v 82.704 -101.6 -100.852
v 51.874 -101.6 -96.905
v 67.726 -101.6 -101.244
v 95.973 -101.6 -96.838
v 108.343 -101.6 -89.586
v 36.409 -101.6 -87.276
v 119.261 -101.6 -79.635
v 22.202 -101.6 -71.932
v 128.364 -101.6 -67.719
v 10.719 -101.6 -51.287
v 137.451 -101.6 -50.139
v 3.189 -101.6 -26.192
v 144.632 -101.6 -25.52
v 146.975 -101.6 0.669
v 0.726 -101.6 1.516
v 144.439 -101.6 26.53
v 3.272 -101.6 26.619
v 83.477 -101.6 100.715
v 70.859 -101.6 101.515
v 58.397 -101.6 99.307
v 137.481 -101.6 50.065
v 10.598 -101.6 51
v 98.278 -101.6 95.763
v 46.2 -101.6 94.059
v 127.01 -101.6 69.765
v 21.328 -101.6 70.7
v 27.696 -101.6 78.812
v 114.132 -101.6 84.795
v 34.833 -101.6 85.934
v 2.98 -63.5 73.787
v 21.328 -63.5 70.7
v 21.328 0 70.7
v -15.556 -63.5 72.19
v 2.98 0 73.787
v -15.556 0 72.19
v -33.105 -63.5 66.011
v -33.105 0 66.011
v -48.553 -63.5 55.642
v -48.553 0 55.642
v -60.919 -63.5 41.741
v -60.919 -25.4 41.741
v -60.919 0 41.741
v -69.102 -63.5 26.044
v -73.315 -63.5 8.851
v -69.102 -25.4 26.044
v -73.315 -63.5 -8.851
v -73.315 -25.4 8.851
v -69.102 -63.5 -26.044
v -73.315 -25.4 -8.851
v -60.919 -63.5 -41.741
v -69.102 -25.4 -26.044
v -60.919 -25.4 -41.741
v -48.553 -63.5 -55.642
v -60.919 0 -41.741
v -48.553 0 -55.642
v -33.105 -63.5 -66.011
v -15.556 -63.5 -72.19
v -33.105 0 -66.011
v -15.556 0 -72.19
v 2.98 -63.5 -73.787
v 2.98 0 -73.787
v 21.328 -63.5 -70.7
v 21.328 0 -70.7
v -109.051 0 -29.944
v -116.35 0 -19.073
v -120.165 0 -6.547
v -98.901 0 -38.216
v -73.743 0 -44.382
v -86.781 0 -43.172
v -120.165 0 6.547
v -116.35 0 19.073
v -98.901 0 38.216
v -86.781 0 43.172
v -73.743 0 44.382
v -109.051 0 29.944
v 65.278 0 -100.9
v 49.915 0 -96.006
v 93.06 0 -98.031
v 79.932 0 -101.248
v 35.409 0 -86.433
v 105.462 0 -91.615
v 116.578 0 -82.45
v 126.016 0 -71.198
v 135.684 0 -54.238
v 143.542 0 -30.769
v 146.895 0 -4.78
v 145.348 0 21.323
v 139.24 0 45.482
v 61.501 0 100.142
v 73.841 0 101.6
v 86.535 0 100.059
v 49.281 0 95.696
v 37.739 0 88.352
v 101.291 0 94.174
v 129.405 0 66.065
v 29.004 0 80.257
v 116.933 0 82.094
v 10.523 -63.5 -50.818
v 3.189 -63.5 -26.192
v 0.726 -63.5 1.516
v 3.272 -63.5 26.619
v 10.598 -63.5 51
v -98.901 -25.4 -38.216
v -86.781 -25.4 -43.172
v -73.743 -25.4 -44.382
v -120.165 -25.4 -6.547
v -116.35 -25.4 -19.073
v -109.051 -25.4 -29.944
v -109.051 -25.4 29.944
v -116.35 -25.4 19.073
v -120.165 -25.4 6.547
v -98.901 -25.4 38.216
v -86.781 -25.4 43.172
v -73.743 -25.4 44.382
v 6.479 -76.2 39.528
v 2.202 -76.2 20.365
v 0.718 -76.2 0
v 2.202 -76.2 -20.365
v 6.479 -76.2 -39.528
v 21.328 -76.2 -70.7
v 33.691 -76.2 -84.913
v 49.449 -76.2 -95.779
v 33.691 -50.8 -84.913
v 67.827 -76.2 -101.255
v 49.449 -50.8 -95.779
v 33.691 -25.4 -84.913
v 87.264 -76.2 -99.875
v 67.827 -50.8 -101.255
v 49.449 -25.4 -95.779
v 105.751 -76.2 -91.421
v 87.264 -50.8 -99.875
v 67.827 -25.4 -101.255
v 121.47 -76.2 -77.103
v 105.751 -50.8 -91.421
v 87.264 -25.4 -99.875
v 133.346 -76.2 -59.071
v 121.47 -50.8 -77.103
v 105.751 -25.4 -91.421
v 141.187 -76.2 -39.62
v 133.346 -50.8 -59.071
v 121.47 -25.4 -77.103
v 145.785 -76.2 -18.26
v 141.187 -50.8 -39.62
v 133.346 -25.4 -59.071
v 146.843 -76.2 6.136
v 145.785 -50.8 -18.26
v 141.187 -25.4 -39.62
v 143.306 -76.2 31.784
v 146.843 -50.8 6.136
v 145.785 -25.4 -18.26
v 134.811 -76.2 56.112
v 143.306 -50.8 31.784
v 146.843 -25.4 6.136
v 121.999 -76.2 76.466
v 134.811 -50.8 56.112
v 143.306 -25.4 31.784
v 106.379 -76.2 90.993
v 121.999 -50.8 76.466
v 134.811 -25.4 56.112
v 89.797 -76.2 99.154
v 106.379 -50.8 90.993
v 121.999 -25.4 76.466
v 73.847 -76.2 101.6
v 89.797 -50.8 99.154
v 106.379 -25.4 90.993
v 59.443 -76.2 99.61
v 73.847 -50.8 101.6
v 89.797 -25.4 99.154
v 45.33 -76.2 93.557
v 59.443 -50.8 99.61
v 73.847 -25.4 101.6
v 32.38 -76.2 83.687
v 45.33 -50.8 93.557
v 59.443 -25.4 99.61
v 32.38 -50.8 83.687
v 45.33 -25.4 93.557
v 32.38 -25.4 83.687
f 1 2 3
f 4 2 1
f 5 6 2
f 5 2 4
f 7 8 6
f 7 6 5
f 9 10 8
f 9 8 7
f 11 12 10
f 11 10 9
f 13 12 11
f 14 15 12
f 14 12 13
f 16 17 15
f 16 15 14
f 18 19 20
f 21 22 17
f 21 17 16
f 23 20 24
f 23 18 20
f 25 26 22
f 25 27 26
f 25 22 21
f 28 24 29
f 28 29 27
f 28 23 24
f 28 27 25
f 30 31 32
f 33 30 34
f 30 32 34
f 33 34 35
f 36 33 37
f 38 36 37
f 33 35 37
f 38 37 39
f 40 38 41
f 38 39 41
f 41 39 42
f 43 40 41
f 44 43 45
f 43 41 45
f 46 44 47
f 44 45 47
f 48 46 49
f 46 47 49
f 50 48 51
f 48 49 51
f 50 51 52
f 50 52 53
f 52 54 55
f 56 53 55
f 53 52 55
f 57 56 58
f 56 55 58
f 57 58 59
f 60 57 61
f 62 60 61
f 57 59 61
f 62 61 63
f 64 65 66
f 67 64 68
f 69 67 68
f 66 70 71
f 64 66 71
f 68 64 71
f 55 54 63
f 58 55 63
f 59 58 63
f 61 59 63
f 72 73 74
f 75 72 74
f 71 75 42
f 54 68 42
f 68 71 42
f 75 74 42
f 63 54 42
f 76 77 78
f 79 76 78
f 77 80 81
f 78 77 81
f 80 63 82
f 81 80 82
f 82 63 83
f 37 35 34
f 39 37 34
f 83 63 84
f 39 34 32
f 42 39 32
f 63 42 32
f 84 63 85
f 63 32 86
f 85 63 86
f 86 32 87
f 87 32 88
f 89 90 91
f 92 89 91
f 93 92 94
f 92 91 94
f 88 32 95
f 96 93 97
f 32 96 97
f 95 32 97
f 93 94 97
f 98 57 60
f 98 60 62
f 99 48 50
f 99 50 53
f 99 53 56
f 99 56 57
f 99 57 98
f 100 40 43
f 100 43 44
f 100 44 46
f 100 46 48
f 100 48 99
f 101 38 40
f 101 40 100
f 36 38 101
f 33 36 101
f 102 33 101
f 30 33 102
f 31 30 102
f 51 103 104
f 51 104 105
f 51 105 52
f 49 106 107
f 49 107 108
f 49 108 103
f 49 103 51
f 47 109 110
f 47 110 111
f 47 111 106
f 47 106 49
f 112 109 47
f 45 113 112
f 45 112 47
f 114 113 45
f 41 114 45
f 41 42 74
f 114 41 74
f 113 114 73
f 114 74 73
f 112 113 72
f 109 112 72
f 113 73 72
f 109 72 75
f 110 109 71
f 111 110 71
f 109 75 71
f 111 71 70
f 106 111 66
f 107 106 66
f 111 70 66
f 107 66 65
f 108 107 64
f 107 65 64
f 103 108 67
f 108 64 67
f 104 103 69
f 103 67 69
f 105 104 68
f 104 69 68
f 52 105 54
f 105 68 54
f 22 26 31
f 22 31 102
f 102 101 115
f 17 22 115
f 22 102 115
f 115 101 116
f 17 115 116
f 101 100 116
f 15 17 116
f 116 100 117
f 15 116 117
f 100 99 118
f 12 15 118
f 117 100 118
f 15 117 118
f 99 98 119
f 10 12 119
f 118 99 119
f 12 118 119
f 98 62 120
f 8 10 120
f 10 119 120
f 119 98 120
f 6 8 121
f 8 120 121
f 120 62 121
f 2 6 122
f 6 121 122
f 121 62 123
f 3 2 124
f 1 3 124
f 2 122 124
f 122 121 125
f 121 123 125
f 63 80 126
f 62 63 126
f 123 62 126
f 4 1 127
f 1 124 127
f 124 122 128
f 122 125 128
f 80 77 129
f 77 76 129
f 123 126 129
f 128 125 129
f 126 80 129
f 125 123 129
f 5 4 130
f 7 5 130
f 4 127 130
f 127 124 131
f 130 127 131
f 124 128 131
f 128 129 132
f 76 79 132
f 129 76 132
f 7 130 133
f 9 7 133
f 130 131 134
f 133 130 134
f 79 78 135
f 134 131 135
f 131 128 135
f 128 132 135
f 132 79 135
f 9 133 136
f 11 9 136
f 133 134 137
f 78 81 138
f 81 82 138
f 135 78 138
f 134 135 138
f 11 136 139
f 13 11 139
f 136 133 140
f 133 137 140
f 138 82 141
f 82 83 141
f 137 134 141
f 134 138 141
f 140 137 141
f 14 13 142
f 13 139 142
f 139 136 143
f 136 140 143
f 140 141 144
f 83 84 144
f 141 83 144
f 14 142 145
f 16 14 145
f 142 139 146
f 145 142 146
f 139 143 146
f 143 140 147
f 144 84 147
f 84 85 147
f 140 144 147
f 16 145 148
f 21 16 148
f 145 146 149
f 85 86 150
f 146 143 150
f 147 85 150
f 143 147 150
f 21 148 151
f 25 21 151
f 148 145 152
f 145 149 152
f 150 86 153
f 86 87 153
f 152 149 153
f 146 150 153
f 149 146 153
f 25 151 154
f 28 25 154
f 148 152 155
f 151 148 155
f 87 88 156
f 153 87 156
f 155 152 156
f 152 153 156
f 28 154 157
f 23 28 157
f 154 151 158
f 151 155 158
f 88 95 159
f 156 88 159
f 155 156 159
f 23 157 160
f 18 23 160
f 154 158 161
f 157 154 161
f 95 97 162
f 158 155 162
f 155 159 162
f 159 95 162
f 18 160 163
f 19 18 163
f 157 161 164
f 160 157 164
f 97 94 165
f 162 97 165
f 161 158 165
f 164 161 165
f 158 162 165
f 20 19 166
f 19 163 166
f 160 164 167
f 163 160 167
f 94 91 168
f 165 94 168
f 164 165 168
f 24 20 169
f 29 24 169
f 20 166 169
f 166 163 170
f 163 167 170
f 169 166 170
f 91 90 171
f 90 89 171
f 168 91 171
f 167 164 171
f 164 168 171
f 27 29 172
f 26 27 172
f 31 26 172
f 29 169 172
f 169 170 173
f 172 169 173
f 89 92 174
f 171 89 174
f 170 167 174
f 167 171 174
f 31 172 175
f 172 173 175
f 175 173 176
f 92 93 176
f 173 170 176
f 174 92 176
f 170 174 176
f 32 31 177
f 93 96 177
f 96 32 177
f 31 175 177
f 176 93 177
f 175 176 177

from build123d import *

# Parameters (mm, degrees)
F1_DEPTH = 25.4
F2_DEPTH = 63.5
F3_DEPTH = 101.6


with BuildPart() as f1:
    # F0 (on Front) → F1 (new body)
    with BuildSketch(Plane.XZ):
        with BuildLine():
            ThreePointArc((-60.9186488081, -41.7406612999), (-70.5408318627, -21.8484694768), (-73.8468995853, 0))
            ThreePointArc((-73.8468995853, 0), (-70.5408318627, 21.8484694768), (-60.9186488081, 41.7406612999))
            ThreePointArc((-60.9186488081, 41.7406612999), (-120.65, 0), (-60.9186488081, -41.7406612999))
        make_face()
    extrude(amount=F1_DEPTH)

    # F0 (on Front) → F2 (join)
    with BuildSketch(Plane.XZ):
        with BuildLine():
            Line((-73.8468995853, 0), (-31.75, 0))
            ThreePointArc((-31.75, 0), (-39.7647247816, 25.4612101001), (-60.9186488081, 41.7406612999))
            ThreePointArc((-60.9186488081, 41.7406612999), (-70.5408318627, 21.8484694768), (-73.8468995853, 0))
        make_face()
        with BuildLine():
            ThreePointArc((-60.9186488081, -41.7406612999), (-39.7647247816, -25.4612101001), (-31.75, 0))
            Line((-31.75, 0), (-73.8468995853, 0))
            ThreePointArc((-73.8468995853, 0), (-70.5408318627, -21.8484694768), (-60.9186488081, -41.7406612999))
        make_face()
        with BuildLine():
            ThreePointArc((-60.9186488081, 41.7406612999), (-39.7647247816, 25.4612101001), (-31.75, 0))
            ThreePointArc((-31.75, 0), (-39.7647247816, -25.4612101001), (-60.9186488081, -41.7406612999))
            ThreePointArc((-60.9186488081, -41.7406612999), (-24.5260284139, -69.6551398577), (21.3275323846, -70.7000773743))
            add(Edge.make_bspline(
                [(21.3275323846, 70.7000773743), (-27.9803553448, 0), (21.3275323846, -70.7000773743)],
                knots=[0.8011700317, 0.8011700317, 0.8011700317, 2.3404226219, 2.3404226219, 2.3404226219], degree=2, weights=[1, 0.7181707686, 1]))
            ThreePointArc((21.3275323846, 70.7000773743), (-24.5260284139, 69.6551398577), (-60.9186488081, 41.7406612999))
        make_face()
    extrude(amount=F2_DEPTH)

    # F0 (on Front) → F3 (join)
    with BuildSketch(Plane.XZ):
        with BuildLine():
            ThreePointArc((73.8468995853, 0), (59.2804213917, 44.0363056803), (21.3275323846, 70.7000773743))
            add(Edge.make_bspline(
                [(21.3275323846, 70.7000773743), (-27.9803553448, 0), (21.3275323846, -70.7000773743)],
                knots=[0.8011700317, 0.8011700317, 0.8011700317, 2.3404226219, 2.3404226219, 2.3404226219], degree=2, weights=[1, 0.7181707686, 1]))
            ThreePointArc((21.3275323846, -70.7000773743), (59.2804213917, -44.0363056803), (73.8468995853, 0))
        make_face()
        with BuildLine():
            add(Edge.make_bspline(
                [(73.8468995853, 101.6), (42.877861214, 101.6), (21.3275323846, 70.7000773743)],
                knots=[0, 0, 0, 0.8011700317, 0.8011700317, 0.8011700317], degree=2, weights=[1, 0.9208330205, 1]))
            ThreePointArc((21.3275323846, 70.7000773743), (59.2804213917, 44.0363056803), (73.8468995853, 0))
            Line((73.8468995853, 0), (73.8468995853, 101.6))
        make_face()
        with BuildLine():
            ThreePointArc((73.8468995853, 0), (59.2804213917, -44.0363056803), (21.3275323846, -70.7000773743))
            add(Edge.make_bspline(
                [(21.3275323846, -70.7000773743), (98.1411920419, -180.8392849383), (141.1868271444, -39.6196424692), (184.2324622468, 101.6), (73.8468995853, 101.6)],
                knots=[2.3404226219, 2.3404226219, 2.3404226219, 4.3118039645, 4.3118039645, 6.2831853072, 6.2831853072, 6.2831853072], degree=2, weights=[1, 0.5522874655, 1, 0.5522874655, 1]))
            Line((73.8468995853, 101.6), (73.8468995853, 0))
        make_face()
    extrude(amount=F3_DEPTH)


solid = f1.part
